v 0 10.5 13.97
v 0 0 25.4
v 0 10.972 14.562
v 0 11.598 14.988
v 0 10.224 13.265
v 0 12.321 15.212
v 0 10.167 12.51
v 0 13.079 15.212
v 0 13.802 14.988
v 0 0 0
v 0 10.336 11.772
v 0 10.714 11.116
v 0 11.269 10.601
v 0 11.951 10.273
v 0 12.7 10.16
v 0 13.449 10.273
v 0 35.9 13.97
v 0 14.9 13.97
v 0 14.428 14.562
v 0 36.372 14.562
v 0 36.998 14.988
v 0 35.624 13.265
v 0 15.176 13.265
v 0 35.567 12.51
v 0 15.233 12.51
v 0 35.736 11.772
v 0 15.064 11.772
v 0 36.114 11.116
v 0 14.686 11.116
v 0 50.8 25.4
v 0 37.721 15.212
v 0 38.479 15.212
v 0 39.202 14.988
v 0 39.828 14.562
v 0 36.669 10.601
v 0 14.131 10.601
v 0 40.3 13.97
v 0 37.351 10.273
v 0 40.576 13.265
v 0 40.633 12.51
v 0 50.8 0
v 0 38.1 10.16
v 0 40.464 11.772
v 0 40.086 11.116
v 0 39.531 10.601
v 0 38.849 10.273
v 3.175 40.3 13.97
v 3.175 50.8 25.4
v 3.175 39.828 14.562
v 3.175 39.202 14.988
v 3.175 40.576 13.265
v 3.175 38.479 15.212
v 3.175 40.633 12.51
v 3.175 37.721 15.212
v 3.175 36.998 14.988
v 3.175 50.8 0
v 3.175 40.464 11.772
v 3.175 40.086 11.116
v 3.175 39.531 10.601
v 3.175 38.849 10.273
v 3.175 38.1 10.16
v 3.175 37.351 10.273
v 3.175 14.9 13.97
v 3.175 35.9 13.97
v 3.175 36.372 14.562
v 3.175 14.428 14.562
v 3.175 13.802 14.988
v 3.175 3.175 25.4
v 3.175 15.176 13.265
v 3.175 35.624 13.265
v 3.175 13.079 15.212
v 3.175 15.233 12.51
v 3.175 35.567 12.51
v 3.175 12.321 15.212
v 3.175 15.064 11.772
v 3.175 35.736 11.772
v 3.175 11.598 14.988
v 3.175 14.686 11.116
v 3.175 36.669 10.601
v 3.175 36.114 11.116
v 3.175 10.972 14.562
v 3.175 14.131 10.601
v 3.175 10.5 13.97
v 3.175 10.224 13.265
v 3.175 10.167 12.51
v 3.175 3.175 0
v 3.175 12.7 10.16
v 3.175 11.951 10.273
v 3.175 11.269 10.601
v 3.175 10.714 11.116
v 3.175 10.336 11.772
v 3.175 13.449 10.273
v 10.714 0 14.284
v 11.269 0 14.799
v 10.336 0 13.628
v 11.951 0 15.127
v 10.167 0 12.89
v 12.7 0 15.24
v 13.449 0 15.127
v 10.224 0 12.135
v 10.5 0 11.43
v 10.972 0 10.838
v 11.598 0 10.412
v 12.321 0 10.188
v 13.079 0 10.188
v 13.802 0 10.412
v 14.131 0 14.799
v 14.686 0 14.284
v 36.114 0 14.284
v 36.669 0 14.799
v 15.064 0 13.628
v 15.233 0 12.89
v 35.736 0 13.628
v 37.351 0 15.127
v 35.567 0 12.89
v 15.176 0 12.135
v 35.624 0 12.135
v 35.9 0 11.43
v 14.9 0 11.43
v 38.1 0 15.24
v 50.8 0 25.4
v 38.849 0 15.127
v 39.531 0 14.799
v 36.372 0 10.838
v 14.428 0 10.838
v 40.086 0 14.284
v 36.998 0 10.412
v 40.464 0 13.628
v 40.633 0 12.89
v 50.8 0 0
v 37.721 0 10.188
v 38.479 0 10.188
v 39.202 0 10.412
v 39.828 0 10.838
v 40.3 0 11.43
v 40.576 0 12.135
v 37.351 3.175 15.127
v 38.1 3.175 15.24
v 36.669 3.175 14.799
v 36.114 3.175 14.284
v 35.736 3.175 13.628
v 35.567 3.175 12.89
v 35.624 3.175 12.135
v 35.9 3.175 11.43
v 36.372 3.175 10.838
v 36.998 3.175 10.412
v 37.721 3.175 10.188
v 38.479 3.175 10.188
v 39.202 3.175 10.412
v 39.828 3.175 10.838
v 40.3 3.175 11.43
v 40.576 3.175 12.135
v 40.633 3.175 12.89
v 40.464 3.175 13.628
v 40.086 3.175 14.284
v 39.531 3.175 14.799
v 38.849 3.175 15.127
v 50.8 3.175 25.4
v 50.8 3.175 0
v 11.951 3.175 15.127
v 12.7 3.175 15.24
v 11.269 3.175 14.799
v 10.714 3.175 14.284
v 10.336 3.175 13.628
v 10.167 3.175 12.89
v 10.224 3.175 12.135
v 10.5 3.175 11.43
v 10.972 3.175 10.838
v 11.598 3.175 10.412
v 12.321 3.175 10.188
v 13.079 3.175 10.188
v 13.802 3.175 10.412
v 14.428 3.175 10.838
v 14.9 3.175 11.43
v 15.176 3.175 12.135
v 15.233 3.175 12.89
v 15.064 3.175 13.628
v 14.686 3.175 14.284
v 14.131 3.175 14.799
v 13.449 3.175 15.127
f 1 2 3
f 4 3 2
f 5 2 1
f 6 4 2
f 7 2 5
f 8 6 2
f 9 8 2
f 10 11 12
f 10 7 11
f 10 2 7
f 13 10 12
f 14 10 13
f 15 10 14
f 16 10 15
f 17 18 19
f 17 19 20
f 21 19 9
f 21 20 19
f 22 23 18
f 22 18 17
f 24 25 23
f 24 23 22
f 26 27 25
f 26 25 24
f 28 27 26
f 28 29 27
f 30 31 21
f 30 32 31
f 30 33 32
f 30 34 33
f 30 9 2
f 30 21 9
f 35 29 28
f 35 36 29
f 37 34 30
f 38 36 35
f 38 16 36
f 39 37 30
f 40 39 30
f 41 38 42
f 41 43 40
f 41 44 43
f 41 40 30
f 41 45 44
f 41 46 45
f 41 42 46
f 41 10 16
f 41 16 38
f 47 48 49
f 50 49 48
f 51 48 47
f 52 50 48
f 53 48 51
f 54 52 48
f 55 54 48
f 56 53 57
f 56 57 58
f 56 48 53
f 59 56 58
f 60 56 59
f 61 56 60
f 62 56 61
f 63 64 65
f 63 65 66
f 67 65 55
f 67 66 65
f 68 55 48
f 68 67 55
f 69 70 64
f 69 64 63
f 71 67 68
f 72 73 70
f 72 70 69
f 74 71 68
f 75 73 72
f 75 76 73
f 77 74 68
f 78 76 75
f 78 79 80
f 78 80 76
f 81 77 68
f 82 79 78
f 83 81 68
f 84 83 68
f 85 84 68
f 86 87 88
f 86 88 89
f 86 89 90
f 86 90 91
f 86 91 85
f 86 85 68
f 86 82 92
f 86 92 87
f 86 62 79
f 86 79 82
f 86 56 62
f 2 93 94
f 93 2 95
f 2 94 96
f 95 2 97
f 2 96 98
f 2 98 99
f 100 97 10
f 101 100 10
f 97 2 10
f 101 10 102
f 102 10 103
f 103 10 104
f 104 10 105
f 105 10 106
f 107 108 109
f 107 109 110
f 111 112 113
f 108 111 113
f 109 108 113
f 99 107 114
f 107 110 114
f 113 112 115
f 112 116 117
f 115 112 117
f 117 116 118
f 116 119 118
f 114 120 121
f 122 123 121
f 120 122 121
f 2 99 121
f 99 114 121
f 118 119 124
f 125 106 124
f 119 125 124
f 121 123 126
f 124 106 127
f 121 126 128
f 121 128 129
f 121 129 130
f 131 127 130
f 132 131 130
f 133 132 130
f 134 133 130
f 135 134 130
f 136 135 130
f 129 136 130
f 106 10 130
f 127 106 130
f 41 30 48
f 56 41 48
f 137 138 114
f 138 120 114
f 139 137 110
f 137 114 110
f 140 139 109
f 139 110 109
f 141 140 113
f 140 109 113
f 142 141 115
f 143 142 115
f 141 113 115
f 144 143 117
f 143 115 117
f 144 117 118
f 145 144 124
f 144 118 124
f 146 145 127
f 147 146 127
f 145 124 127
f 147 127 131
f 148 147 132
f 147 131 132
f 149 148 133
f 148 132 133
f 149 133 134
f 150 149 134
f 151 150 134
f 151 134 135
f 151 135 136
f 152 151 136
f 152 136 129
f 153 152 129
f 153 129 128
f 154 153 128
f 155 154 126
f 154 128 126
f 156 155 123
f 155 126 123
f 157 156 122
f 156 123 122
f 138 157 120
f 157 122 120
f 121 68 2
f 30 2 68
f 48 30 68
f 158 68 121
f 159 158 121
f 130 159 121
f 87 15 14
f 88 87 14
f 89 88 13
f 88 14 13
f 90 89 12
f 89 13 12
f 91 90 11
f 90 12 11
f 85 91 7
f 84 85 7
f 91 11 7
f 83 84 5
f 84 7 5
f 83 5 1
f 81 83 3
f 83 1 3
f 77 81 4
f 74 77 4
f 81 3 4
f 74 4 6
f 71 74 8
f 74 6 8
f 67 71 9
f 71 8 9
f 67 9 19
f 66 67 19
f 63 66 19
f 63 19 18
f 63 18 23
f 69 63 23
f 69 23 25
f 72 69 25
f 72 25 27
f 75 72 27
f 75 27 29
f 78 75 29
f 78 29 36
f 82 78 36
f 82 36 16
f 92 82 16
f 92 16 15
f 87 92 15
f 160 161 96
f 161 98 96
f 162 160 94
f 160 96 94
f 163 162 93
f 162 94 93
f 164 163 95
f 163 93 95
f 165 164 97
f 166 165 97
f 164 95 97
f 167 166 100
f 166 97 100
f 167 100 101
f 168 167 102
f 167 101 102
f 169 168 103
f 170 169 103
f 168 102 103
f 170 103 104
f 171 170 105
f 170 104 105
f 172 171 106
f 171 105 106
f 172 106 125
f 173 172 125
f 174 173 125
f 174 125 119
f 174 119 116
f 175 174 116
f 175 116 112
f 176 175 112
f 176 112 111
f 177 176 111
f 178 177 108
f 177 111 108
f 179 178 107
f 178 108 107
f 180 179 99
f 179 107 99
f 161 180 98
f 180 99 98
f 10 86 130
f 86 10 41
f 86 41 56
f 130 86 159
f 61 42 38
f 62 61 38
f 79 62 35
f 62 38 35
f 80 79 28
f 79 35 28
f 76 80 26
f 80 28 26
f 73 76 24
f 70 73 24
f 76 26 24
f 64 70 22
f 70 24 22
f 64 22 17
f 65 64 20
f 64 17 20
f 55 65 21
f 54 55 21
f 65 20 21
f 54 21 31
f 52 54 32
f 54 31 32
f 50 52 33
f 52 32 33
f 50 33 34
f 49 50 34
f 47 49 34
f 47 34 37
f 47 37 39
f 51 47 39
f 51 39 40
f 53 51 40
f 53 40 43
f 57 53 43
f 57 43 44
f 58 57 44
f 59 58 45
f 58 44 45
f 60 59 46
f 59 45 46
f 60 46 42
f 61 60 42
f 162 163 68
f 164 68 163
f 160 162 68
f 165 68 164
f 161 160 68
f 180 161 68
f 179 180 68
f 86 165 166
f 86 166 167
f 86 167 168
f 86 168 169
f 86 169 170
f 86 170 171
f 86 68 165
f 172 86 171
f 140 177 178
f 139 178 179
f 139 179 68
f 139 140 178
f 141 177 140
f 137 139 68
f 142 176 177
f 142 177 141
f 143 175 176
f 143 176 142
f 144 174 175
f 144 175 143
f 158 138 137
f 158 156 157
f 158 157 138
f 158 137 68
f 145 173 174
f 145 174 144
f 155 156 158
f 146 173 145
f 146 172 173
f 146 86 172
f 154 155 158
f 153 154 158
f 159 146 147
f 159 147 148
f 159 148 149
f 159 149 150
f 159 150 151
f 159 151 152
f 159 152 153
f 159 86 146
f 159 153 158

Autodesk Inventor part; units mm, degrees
ref_plane "YZ Plane" through (0, 0, 0) normal (1, 0, 0) x (0, 1, 0)
ref_plane "XZ Plane" through (0, 0, 0) normal (0, 1, 0) x (-1, 0, 0)
ref_plane "XY Plane" through (0, 0, 0) normal (0, 0, 1) x (1, 0, 0)
sketch "Sketch1" plane through (0, 0, 0) normal (0, 0, 1) x (1, 0, 0)
  line L0 (0, 0) -> (0, 50.8)
  line L1 (0, 50.8) -> (3.175, 50.8)
  line L2 (3.175, 50.8) -> (3.175, 3.175)
  line L3 (3.175, 3.175) -> (50.8, 3.175)
  line L4 (0, 0) -> (50.8, 0)
  line L5 (50.8, 3.175) -> (50.8, 0)
  dimension "d0" = 50.8
  dimension "d1" = 3.175
  dimension "d2" = 47.625
  dimension "d5" = 50.8
  dimension "d6" = 3.175
extrude "Extrusion1" add sketch "Sketch1" along normal blind 25.4
sketch "Sketch2" plane through (3.175, 3.175, 0) normal (1, 0, 0) x (0, 0, -1)
  line L0 (0, 47.625) -> (-25.4, 47.625) projected
  line L1 (-25.4, 0) -> (-25.4, 47.625) projected
  line L2 (0, 0) -> (-25.4, 0) projected
  point P0 (0, -3.175)
  point P1 (-12.7, 34.925)
  point P2 (-12.7, 9.525)
  dimension "d16" = 12.7
  dimension "d17" = 12.7
  dimension "d19" = 12.7
  dimension "d34" = 25.4
hole "Hole1" at (3.175, 38.1, 12.7) at (3.175, 12.7, 12.7) direction (-1, 0, 0) diameter 5.08 end through all
sketch "Sketch3" plane through (3.175, 3.175, 0) normal (0, 1, 0) x (1, 0, 0)
  line L0 (47.625, -25.4) -> (0, -25.4) projected
  line L1 (0, 0) -> (0, -25.4) projected
  line L2 (47.625, 0) -> (47.625, -25.4) projected
  point P0 (-3.175, 0)
  point P1 (9.525, -12.7)
  point P2 (34.925, -12.7)
  dimension "d23" = 12.7
  dimension "d25" = 12.7
  dimension "d26" = 12.7
  dimension "d35" = 25.4
hole "Hole2" at (12.7, 3.175, 12.7) at (38.1, 3.175, 12.7) direction (0, -1, 0) diameter 5.08 end through all
equation "\"d2\" = d0 - d6"
equation "\"d6\" = d1"
properties part number "Centerpiece-90CornerBracket" material "Aluminum 6061-AHC"
